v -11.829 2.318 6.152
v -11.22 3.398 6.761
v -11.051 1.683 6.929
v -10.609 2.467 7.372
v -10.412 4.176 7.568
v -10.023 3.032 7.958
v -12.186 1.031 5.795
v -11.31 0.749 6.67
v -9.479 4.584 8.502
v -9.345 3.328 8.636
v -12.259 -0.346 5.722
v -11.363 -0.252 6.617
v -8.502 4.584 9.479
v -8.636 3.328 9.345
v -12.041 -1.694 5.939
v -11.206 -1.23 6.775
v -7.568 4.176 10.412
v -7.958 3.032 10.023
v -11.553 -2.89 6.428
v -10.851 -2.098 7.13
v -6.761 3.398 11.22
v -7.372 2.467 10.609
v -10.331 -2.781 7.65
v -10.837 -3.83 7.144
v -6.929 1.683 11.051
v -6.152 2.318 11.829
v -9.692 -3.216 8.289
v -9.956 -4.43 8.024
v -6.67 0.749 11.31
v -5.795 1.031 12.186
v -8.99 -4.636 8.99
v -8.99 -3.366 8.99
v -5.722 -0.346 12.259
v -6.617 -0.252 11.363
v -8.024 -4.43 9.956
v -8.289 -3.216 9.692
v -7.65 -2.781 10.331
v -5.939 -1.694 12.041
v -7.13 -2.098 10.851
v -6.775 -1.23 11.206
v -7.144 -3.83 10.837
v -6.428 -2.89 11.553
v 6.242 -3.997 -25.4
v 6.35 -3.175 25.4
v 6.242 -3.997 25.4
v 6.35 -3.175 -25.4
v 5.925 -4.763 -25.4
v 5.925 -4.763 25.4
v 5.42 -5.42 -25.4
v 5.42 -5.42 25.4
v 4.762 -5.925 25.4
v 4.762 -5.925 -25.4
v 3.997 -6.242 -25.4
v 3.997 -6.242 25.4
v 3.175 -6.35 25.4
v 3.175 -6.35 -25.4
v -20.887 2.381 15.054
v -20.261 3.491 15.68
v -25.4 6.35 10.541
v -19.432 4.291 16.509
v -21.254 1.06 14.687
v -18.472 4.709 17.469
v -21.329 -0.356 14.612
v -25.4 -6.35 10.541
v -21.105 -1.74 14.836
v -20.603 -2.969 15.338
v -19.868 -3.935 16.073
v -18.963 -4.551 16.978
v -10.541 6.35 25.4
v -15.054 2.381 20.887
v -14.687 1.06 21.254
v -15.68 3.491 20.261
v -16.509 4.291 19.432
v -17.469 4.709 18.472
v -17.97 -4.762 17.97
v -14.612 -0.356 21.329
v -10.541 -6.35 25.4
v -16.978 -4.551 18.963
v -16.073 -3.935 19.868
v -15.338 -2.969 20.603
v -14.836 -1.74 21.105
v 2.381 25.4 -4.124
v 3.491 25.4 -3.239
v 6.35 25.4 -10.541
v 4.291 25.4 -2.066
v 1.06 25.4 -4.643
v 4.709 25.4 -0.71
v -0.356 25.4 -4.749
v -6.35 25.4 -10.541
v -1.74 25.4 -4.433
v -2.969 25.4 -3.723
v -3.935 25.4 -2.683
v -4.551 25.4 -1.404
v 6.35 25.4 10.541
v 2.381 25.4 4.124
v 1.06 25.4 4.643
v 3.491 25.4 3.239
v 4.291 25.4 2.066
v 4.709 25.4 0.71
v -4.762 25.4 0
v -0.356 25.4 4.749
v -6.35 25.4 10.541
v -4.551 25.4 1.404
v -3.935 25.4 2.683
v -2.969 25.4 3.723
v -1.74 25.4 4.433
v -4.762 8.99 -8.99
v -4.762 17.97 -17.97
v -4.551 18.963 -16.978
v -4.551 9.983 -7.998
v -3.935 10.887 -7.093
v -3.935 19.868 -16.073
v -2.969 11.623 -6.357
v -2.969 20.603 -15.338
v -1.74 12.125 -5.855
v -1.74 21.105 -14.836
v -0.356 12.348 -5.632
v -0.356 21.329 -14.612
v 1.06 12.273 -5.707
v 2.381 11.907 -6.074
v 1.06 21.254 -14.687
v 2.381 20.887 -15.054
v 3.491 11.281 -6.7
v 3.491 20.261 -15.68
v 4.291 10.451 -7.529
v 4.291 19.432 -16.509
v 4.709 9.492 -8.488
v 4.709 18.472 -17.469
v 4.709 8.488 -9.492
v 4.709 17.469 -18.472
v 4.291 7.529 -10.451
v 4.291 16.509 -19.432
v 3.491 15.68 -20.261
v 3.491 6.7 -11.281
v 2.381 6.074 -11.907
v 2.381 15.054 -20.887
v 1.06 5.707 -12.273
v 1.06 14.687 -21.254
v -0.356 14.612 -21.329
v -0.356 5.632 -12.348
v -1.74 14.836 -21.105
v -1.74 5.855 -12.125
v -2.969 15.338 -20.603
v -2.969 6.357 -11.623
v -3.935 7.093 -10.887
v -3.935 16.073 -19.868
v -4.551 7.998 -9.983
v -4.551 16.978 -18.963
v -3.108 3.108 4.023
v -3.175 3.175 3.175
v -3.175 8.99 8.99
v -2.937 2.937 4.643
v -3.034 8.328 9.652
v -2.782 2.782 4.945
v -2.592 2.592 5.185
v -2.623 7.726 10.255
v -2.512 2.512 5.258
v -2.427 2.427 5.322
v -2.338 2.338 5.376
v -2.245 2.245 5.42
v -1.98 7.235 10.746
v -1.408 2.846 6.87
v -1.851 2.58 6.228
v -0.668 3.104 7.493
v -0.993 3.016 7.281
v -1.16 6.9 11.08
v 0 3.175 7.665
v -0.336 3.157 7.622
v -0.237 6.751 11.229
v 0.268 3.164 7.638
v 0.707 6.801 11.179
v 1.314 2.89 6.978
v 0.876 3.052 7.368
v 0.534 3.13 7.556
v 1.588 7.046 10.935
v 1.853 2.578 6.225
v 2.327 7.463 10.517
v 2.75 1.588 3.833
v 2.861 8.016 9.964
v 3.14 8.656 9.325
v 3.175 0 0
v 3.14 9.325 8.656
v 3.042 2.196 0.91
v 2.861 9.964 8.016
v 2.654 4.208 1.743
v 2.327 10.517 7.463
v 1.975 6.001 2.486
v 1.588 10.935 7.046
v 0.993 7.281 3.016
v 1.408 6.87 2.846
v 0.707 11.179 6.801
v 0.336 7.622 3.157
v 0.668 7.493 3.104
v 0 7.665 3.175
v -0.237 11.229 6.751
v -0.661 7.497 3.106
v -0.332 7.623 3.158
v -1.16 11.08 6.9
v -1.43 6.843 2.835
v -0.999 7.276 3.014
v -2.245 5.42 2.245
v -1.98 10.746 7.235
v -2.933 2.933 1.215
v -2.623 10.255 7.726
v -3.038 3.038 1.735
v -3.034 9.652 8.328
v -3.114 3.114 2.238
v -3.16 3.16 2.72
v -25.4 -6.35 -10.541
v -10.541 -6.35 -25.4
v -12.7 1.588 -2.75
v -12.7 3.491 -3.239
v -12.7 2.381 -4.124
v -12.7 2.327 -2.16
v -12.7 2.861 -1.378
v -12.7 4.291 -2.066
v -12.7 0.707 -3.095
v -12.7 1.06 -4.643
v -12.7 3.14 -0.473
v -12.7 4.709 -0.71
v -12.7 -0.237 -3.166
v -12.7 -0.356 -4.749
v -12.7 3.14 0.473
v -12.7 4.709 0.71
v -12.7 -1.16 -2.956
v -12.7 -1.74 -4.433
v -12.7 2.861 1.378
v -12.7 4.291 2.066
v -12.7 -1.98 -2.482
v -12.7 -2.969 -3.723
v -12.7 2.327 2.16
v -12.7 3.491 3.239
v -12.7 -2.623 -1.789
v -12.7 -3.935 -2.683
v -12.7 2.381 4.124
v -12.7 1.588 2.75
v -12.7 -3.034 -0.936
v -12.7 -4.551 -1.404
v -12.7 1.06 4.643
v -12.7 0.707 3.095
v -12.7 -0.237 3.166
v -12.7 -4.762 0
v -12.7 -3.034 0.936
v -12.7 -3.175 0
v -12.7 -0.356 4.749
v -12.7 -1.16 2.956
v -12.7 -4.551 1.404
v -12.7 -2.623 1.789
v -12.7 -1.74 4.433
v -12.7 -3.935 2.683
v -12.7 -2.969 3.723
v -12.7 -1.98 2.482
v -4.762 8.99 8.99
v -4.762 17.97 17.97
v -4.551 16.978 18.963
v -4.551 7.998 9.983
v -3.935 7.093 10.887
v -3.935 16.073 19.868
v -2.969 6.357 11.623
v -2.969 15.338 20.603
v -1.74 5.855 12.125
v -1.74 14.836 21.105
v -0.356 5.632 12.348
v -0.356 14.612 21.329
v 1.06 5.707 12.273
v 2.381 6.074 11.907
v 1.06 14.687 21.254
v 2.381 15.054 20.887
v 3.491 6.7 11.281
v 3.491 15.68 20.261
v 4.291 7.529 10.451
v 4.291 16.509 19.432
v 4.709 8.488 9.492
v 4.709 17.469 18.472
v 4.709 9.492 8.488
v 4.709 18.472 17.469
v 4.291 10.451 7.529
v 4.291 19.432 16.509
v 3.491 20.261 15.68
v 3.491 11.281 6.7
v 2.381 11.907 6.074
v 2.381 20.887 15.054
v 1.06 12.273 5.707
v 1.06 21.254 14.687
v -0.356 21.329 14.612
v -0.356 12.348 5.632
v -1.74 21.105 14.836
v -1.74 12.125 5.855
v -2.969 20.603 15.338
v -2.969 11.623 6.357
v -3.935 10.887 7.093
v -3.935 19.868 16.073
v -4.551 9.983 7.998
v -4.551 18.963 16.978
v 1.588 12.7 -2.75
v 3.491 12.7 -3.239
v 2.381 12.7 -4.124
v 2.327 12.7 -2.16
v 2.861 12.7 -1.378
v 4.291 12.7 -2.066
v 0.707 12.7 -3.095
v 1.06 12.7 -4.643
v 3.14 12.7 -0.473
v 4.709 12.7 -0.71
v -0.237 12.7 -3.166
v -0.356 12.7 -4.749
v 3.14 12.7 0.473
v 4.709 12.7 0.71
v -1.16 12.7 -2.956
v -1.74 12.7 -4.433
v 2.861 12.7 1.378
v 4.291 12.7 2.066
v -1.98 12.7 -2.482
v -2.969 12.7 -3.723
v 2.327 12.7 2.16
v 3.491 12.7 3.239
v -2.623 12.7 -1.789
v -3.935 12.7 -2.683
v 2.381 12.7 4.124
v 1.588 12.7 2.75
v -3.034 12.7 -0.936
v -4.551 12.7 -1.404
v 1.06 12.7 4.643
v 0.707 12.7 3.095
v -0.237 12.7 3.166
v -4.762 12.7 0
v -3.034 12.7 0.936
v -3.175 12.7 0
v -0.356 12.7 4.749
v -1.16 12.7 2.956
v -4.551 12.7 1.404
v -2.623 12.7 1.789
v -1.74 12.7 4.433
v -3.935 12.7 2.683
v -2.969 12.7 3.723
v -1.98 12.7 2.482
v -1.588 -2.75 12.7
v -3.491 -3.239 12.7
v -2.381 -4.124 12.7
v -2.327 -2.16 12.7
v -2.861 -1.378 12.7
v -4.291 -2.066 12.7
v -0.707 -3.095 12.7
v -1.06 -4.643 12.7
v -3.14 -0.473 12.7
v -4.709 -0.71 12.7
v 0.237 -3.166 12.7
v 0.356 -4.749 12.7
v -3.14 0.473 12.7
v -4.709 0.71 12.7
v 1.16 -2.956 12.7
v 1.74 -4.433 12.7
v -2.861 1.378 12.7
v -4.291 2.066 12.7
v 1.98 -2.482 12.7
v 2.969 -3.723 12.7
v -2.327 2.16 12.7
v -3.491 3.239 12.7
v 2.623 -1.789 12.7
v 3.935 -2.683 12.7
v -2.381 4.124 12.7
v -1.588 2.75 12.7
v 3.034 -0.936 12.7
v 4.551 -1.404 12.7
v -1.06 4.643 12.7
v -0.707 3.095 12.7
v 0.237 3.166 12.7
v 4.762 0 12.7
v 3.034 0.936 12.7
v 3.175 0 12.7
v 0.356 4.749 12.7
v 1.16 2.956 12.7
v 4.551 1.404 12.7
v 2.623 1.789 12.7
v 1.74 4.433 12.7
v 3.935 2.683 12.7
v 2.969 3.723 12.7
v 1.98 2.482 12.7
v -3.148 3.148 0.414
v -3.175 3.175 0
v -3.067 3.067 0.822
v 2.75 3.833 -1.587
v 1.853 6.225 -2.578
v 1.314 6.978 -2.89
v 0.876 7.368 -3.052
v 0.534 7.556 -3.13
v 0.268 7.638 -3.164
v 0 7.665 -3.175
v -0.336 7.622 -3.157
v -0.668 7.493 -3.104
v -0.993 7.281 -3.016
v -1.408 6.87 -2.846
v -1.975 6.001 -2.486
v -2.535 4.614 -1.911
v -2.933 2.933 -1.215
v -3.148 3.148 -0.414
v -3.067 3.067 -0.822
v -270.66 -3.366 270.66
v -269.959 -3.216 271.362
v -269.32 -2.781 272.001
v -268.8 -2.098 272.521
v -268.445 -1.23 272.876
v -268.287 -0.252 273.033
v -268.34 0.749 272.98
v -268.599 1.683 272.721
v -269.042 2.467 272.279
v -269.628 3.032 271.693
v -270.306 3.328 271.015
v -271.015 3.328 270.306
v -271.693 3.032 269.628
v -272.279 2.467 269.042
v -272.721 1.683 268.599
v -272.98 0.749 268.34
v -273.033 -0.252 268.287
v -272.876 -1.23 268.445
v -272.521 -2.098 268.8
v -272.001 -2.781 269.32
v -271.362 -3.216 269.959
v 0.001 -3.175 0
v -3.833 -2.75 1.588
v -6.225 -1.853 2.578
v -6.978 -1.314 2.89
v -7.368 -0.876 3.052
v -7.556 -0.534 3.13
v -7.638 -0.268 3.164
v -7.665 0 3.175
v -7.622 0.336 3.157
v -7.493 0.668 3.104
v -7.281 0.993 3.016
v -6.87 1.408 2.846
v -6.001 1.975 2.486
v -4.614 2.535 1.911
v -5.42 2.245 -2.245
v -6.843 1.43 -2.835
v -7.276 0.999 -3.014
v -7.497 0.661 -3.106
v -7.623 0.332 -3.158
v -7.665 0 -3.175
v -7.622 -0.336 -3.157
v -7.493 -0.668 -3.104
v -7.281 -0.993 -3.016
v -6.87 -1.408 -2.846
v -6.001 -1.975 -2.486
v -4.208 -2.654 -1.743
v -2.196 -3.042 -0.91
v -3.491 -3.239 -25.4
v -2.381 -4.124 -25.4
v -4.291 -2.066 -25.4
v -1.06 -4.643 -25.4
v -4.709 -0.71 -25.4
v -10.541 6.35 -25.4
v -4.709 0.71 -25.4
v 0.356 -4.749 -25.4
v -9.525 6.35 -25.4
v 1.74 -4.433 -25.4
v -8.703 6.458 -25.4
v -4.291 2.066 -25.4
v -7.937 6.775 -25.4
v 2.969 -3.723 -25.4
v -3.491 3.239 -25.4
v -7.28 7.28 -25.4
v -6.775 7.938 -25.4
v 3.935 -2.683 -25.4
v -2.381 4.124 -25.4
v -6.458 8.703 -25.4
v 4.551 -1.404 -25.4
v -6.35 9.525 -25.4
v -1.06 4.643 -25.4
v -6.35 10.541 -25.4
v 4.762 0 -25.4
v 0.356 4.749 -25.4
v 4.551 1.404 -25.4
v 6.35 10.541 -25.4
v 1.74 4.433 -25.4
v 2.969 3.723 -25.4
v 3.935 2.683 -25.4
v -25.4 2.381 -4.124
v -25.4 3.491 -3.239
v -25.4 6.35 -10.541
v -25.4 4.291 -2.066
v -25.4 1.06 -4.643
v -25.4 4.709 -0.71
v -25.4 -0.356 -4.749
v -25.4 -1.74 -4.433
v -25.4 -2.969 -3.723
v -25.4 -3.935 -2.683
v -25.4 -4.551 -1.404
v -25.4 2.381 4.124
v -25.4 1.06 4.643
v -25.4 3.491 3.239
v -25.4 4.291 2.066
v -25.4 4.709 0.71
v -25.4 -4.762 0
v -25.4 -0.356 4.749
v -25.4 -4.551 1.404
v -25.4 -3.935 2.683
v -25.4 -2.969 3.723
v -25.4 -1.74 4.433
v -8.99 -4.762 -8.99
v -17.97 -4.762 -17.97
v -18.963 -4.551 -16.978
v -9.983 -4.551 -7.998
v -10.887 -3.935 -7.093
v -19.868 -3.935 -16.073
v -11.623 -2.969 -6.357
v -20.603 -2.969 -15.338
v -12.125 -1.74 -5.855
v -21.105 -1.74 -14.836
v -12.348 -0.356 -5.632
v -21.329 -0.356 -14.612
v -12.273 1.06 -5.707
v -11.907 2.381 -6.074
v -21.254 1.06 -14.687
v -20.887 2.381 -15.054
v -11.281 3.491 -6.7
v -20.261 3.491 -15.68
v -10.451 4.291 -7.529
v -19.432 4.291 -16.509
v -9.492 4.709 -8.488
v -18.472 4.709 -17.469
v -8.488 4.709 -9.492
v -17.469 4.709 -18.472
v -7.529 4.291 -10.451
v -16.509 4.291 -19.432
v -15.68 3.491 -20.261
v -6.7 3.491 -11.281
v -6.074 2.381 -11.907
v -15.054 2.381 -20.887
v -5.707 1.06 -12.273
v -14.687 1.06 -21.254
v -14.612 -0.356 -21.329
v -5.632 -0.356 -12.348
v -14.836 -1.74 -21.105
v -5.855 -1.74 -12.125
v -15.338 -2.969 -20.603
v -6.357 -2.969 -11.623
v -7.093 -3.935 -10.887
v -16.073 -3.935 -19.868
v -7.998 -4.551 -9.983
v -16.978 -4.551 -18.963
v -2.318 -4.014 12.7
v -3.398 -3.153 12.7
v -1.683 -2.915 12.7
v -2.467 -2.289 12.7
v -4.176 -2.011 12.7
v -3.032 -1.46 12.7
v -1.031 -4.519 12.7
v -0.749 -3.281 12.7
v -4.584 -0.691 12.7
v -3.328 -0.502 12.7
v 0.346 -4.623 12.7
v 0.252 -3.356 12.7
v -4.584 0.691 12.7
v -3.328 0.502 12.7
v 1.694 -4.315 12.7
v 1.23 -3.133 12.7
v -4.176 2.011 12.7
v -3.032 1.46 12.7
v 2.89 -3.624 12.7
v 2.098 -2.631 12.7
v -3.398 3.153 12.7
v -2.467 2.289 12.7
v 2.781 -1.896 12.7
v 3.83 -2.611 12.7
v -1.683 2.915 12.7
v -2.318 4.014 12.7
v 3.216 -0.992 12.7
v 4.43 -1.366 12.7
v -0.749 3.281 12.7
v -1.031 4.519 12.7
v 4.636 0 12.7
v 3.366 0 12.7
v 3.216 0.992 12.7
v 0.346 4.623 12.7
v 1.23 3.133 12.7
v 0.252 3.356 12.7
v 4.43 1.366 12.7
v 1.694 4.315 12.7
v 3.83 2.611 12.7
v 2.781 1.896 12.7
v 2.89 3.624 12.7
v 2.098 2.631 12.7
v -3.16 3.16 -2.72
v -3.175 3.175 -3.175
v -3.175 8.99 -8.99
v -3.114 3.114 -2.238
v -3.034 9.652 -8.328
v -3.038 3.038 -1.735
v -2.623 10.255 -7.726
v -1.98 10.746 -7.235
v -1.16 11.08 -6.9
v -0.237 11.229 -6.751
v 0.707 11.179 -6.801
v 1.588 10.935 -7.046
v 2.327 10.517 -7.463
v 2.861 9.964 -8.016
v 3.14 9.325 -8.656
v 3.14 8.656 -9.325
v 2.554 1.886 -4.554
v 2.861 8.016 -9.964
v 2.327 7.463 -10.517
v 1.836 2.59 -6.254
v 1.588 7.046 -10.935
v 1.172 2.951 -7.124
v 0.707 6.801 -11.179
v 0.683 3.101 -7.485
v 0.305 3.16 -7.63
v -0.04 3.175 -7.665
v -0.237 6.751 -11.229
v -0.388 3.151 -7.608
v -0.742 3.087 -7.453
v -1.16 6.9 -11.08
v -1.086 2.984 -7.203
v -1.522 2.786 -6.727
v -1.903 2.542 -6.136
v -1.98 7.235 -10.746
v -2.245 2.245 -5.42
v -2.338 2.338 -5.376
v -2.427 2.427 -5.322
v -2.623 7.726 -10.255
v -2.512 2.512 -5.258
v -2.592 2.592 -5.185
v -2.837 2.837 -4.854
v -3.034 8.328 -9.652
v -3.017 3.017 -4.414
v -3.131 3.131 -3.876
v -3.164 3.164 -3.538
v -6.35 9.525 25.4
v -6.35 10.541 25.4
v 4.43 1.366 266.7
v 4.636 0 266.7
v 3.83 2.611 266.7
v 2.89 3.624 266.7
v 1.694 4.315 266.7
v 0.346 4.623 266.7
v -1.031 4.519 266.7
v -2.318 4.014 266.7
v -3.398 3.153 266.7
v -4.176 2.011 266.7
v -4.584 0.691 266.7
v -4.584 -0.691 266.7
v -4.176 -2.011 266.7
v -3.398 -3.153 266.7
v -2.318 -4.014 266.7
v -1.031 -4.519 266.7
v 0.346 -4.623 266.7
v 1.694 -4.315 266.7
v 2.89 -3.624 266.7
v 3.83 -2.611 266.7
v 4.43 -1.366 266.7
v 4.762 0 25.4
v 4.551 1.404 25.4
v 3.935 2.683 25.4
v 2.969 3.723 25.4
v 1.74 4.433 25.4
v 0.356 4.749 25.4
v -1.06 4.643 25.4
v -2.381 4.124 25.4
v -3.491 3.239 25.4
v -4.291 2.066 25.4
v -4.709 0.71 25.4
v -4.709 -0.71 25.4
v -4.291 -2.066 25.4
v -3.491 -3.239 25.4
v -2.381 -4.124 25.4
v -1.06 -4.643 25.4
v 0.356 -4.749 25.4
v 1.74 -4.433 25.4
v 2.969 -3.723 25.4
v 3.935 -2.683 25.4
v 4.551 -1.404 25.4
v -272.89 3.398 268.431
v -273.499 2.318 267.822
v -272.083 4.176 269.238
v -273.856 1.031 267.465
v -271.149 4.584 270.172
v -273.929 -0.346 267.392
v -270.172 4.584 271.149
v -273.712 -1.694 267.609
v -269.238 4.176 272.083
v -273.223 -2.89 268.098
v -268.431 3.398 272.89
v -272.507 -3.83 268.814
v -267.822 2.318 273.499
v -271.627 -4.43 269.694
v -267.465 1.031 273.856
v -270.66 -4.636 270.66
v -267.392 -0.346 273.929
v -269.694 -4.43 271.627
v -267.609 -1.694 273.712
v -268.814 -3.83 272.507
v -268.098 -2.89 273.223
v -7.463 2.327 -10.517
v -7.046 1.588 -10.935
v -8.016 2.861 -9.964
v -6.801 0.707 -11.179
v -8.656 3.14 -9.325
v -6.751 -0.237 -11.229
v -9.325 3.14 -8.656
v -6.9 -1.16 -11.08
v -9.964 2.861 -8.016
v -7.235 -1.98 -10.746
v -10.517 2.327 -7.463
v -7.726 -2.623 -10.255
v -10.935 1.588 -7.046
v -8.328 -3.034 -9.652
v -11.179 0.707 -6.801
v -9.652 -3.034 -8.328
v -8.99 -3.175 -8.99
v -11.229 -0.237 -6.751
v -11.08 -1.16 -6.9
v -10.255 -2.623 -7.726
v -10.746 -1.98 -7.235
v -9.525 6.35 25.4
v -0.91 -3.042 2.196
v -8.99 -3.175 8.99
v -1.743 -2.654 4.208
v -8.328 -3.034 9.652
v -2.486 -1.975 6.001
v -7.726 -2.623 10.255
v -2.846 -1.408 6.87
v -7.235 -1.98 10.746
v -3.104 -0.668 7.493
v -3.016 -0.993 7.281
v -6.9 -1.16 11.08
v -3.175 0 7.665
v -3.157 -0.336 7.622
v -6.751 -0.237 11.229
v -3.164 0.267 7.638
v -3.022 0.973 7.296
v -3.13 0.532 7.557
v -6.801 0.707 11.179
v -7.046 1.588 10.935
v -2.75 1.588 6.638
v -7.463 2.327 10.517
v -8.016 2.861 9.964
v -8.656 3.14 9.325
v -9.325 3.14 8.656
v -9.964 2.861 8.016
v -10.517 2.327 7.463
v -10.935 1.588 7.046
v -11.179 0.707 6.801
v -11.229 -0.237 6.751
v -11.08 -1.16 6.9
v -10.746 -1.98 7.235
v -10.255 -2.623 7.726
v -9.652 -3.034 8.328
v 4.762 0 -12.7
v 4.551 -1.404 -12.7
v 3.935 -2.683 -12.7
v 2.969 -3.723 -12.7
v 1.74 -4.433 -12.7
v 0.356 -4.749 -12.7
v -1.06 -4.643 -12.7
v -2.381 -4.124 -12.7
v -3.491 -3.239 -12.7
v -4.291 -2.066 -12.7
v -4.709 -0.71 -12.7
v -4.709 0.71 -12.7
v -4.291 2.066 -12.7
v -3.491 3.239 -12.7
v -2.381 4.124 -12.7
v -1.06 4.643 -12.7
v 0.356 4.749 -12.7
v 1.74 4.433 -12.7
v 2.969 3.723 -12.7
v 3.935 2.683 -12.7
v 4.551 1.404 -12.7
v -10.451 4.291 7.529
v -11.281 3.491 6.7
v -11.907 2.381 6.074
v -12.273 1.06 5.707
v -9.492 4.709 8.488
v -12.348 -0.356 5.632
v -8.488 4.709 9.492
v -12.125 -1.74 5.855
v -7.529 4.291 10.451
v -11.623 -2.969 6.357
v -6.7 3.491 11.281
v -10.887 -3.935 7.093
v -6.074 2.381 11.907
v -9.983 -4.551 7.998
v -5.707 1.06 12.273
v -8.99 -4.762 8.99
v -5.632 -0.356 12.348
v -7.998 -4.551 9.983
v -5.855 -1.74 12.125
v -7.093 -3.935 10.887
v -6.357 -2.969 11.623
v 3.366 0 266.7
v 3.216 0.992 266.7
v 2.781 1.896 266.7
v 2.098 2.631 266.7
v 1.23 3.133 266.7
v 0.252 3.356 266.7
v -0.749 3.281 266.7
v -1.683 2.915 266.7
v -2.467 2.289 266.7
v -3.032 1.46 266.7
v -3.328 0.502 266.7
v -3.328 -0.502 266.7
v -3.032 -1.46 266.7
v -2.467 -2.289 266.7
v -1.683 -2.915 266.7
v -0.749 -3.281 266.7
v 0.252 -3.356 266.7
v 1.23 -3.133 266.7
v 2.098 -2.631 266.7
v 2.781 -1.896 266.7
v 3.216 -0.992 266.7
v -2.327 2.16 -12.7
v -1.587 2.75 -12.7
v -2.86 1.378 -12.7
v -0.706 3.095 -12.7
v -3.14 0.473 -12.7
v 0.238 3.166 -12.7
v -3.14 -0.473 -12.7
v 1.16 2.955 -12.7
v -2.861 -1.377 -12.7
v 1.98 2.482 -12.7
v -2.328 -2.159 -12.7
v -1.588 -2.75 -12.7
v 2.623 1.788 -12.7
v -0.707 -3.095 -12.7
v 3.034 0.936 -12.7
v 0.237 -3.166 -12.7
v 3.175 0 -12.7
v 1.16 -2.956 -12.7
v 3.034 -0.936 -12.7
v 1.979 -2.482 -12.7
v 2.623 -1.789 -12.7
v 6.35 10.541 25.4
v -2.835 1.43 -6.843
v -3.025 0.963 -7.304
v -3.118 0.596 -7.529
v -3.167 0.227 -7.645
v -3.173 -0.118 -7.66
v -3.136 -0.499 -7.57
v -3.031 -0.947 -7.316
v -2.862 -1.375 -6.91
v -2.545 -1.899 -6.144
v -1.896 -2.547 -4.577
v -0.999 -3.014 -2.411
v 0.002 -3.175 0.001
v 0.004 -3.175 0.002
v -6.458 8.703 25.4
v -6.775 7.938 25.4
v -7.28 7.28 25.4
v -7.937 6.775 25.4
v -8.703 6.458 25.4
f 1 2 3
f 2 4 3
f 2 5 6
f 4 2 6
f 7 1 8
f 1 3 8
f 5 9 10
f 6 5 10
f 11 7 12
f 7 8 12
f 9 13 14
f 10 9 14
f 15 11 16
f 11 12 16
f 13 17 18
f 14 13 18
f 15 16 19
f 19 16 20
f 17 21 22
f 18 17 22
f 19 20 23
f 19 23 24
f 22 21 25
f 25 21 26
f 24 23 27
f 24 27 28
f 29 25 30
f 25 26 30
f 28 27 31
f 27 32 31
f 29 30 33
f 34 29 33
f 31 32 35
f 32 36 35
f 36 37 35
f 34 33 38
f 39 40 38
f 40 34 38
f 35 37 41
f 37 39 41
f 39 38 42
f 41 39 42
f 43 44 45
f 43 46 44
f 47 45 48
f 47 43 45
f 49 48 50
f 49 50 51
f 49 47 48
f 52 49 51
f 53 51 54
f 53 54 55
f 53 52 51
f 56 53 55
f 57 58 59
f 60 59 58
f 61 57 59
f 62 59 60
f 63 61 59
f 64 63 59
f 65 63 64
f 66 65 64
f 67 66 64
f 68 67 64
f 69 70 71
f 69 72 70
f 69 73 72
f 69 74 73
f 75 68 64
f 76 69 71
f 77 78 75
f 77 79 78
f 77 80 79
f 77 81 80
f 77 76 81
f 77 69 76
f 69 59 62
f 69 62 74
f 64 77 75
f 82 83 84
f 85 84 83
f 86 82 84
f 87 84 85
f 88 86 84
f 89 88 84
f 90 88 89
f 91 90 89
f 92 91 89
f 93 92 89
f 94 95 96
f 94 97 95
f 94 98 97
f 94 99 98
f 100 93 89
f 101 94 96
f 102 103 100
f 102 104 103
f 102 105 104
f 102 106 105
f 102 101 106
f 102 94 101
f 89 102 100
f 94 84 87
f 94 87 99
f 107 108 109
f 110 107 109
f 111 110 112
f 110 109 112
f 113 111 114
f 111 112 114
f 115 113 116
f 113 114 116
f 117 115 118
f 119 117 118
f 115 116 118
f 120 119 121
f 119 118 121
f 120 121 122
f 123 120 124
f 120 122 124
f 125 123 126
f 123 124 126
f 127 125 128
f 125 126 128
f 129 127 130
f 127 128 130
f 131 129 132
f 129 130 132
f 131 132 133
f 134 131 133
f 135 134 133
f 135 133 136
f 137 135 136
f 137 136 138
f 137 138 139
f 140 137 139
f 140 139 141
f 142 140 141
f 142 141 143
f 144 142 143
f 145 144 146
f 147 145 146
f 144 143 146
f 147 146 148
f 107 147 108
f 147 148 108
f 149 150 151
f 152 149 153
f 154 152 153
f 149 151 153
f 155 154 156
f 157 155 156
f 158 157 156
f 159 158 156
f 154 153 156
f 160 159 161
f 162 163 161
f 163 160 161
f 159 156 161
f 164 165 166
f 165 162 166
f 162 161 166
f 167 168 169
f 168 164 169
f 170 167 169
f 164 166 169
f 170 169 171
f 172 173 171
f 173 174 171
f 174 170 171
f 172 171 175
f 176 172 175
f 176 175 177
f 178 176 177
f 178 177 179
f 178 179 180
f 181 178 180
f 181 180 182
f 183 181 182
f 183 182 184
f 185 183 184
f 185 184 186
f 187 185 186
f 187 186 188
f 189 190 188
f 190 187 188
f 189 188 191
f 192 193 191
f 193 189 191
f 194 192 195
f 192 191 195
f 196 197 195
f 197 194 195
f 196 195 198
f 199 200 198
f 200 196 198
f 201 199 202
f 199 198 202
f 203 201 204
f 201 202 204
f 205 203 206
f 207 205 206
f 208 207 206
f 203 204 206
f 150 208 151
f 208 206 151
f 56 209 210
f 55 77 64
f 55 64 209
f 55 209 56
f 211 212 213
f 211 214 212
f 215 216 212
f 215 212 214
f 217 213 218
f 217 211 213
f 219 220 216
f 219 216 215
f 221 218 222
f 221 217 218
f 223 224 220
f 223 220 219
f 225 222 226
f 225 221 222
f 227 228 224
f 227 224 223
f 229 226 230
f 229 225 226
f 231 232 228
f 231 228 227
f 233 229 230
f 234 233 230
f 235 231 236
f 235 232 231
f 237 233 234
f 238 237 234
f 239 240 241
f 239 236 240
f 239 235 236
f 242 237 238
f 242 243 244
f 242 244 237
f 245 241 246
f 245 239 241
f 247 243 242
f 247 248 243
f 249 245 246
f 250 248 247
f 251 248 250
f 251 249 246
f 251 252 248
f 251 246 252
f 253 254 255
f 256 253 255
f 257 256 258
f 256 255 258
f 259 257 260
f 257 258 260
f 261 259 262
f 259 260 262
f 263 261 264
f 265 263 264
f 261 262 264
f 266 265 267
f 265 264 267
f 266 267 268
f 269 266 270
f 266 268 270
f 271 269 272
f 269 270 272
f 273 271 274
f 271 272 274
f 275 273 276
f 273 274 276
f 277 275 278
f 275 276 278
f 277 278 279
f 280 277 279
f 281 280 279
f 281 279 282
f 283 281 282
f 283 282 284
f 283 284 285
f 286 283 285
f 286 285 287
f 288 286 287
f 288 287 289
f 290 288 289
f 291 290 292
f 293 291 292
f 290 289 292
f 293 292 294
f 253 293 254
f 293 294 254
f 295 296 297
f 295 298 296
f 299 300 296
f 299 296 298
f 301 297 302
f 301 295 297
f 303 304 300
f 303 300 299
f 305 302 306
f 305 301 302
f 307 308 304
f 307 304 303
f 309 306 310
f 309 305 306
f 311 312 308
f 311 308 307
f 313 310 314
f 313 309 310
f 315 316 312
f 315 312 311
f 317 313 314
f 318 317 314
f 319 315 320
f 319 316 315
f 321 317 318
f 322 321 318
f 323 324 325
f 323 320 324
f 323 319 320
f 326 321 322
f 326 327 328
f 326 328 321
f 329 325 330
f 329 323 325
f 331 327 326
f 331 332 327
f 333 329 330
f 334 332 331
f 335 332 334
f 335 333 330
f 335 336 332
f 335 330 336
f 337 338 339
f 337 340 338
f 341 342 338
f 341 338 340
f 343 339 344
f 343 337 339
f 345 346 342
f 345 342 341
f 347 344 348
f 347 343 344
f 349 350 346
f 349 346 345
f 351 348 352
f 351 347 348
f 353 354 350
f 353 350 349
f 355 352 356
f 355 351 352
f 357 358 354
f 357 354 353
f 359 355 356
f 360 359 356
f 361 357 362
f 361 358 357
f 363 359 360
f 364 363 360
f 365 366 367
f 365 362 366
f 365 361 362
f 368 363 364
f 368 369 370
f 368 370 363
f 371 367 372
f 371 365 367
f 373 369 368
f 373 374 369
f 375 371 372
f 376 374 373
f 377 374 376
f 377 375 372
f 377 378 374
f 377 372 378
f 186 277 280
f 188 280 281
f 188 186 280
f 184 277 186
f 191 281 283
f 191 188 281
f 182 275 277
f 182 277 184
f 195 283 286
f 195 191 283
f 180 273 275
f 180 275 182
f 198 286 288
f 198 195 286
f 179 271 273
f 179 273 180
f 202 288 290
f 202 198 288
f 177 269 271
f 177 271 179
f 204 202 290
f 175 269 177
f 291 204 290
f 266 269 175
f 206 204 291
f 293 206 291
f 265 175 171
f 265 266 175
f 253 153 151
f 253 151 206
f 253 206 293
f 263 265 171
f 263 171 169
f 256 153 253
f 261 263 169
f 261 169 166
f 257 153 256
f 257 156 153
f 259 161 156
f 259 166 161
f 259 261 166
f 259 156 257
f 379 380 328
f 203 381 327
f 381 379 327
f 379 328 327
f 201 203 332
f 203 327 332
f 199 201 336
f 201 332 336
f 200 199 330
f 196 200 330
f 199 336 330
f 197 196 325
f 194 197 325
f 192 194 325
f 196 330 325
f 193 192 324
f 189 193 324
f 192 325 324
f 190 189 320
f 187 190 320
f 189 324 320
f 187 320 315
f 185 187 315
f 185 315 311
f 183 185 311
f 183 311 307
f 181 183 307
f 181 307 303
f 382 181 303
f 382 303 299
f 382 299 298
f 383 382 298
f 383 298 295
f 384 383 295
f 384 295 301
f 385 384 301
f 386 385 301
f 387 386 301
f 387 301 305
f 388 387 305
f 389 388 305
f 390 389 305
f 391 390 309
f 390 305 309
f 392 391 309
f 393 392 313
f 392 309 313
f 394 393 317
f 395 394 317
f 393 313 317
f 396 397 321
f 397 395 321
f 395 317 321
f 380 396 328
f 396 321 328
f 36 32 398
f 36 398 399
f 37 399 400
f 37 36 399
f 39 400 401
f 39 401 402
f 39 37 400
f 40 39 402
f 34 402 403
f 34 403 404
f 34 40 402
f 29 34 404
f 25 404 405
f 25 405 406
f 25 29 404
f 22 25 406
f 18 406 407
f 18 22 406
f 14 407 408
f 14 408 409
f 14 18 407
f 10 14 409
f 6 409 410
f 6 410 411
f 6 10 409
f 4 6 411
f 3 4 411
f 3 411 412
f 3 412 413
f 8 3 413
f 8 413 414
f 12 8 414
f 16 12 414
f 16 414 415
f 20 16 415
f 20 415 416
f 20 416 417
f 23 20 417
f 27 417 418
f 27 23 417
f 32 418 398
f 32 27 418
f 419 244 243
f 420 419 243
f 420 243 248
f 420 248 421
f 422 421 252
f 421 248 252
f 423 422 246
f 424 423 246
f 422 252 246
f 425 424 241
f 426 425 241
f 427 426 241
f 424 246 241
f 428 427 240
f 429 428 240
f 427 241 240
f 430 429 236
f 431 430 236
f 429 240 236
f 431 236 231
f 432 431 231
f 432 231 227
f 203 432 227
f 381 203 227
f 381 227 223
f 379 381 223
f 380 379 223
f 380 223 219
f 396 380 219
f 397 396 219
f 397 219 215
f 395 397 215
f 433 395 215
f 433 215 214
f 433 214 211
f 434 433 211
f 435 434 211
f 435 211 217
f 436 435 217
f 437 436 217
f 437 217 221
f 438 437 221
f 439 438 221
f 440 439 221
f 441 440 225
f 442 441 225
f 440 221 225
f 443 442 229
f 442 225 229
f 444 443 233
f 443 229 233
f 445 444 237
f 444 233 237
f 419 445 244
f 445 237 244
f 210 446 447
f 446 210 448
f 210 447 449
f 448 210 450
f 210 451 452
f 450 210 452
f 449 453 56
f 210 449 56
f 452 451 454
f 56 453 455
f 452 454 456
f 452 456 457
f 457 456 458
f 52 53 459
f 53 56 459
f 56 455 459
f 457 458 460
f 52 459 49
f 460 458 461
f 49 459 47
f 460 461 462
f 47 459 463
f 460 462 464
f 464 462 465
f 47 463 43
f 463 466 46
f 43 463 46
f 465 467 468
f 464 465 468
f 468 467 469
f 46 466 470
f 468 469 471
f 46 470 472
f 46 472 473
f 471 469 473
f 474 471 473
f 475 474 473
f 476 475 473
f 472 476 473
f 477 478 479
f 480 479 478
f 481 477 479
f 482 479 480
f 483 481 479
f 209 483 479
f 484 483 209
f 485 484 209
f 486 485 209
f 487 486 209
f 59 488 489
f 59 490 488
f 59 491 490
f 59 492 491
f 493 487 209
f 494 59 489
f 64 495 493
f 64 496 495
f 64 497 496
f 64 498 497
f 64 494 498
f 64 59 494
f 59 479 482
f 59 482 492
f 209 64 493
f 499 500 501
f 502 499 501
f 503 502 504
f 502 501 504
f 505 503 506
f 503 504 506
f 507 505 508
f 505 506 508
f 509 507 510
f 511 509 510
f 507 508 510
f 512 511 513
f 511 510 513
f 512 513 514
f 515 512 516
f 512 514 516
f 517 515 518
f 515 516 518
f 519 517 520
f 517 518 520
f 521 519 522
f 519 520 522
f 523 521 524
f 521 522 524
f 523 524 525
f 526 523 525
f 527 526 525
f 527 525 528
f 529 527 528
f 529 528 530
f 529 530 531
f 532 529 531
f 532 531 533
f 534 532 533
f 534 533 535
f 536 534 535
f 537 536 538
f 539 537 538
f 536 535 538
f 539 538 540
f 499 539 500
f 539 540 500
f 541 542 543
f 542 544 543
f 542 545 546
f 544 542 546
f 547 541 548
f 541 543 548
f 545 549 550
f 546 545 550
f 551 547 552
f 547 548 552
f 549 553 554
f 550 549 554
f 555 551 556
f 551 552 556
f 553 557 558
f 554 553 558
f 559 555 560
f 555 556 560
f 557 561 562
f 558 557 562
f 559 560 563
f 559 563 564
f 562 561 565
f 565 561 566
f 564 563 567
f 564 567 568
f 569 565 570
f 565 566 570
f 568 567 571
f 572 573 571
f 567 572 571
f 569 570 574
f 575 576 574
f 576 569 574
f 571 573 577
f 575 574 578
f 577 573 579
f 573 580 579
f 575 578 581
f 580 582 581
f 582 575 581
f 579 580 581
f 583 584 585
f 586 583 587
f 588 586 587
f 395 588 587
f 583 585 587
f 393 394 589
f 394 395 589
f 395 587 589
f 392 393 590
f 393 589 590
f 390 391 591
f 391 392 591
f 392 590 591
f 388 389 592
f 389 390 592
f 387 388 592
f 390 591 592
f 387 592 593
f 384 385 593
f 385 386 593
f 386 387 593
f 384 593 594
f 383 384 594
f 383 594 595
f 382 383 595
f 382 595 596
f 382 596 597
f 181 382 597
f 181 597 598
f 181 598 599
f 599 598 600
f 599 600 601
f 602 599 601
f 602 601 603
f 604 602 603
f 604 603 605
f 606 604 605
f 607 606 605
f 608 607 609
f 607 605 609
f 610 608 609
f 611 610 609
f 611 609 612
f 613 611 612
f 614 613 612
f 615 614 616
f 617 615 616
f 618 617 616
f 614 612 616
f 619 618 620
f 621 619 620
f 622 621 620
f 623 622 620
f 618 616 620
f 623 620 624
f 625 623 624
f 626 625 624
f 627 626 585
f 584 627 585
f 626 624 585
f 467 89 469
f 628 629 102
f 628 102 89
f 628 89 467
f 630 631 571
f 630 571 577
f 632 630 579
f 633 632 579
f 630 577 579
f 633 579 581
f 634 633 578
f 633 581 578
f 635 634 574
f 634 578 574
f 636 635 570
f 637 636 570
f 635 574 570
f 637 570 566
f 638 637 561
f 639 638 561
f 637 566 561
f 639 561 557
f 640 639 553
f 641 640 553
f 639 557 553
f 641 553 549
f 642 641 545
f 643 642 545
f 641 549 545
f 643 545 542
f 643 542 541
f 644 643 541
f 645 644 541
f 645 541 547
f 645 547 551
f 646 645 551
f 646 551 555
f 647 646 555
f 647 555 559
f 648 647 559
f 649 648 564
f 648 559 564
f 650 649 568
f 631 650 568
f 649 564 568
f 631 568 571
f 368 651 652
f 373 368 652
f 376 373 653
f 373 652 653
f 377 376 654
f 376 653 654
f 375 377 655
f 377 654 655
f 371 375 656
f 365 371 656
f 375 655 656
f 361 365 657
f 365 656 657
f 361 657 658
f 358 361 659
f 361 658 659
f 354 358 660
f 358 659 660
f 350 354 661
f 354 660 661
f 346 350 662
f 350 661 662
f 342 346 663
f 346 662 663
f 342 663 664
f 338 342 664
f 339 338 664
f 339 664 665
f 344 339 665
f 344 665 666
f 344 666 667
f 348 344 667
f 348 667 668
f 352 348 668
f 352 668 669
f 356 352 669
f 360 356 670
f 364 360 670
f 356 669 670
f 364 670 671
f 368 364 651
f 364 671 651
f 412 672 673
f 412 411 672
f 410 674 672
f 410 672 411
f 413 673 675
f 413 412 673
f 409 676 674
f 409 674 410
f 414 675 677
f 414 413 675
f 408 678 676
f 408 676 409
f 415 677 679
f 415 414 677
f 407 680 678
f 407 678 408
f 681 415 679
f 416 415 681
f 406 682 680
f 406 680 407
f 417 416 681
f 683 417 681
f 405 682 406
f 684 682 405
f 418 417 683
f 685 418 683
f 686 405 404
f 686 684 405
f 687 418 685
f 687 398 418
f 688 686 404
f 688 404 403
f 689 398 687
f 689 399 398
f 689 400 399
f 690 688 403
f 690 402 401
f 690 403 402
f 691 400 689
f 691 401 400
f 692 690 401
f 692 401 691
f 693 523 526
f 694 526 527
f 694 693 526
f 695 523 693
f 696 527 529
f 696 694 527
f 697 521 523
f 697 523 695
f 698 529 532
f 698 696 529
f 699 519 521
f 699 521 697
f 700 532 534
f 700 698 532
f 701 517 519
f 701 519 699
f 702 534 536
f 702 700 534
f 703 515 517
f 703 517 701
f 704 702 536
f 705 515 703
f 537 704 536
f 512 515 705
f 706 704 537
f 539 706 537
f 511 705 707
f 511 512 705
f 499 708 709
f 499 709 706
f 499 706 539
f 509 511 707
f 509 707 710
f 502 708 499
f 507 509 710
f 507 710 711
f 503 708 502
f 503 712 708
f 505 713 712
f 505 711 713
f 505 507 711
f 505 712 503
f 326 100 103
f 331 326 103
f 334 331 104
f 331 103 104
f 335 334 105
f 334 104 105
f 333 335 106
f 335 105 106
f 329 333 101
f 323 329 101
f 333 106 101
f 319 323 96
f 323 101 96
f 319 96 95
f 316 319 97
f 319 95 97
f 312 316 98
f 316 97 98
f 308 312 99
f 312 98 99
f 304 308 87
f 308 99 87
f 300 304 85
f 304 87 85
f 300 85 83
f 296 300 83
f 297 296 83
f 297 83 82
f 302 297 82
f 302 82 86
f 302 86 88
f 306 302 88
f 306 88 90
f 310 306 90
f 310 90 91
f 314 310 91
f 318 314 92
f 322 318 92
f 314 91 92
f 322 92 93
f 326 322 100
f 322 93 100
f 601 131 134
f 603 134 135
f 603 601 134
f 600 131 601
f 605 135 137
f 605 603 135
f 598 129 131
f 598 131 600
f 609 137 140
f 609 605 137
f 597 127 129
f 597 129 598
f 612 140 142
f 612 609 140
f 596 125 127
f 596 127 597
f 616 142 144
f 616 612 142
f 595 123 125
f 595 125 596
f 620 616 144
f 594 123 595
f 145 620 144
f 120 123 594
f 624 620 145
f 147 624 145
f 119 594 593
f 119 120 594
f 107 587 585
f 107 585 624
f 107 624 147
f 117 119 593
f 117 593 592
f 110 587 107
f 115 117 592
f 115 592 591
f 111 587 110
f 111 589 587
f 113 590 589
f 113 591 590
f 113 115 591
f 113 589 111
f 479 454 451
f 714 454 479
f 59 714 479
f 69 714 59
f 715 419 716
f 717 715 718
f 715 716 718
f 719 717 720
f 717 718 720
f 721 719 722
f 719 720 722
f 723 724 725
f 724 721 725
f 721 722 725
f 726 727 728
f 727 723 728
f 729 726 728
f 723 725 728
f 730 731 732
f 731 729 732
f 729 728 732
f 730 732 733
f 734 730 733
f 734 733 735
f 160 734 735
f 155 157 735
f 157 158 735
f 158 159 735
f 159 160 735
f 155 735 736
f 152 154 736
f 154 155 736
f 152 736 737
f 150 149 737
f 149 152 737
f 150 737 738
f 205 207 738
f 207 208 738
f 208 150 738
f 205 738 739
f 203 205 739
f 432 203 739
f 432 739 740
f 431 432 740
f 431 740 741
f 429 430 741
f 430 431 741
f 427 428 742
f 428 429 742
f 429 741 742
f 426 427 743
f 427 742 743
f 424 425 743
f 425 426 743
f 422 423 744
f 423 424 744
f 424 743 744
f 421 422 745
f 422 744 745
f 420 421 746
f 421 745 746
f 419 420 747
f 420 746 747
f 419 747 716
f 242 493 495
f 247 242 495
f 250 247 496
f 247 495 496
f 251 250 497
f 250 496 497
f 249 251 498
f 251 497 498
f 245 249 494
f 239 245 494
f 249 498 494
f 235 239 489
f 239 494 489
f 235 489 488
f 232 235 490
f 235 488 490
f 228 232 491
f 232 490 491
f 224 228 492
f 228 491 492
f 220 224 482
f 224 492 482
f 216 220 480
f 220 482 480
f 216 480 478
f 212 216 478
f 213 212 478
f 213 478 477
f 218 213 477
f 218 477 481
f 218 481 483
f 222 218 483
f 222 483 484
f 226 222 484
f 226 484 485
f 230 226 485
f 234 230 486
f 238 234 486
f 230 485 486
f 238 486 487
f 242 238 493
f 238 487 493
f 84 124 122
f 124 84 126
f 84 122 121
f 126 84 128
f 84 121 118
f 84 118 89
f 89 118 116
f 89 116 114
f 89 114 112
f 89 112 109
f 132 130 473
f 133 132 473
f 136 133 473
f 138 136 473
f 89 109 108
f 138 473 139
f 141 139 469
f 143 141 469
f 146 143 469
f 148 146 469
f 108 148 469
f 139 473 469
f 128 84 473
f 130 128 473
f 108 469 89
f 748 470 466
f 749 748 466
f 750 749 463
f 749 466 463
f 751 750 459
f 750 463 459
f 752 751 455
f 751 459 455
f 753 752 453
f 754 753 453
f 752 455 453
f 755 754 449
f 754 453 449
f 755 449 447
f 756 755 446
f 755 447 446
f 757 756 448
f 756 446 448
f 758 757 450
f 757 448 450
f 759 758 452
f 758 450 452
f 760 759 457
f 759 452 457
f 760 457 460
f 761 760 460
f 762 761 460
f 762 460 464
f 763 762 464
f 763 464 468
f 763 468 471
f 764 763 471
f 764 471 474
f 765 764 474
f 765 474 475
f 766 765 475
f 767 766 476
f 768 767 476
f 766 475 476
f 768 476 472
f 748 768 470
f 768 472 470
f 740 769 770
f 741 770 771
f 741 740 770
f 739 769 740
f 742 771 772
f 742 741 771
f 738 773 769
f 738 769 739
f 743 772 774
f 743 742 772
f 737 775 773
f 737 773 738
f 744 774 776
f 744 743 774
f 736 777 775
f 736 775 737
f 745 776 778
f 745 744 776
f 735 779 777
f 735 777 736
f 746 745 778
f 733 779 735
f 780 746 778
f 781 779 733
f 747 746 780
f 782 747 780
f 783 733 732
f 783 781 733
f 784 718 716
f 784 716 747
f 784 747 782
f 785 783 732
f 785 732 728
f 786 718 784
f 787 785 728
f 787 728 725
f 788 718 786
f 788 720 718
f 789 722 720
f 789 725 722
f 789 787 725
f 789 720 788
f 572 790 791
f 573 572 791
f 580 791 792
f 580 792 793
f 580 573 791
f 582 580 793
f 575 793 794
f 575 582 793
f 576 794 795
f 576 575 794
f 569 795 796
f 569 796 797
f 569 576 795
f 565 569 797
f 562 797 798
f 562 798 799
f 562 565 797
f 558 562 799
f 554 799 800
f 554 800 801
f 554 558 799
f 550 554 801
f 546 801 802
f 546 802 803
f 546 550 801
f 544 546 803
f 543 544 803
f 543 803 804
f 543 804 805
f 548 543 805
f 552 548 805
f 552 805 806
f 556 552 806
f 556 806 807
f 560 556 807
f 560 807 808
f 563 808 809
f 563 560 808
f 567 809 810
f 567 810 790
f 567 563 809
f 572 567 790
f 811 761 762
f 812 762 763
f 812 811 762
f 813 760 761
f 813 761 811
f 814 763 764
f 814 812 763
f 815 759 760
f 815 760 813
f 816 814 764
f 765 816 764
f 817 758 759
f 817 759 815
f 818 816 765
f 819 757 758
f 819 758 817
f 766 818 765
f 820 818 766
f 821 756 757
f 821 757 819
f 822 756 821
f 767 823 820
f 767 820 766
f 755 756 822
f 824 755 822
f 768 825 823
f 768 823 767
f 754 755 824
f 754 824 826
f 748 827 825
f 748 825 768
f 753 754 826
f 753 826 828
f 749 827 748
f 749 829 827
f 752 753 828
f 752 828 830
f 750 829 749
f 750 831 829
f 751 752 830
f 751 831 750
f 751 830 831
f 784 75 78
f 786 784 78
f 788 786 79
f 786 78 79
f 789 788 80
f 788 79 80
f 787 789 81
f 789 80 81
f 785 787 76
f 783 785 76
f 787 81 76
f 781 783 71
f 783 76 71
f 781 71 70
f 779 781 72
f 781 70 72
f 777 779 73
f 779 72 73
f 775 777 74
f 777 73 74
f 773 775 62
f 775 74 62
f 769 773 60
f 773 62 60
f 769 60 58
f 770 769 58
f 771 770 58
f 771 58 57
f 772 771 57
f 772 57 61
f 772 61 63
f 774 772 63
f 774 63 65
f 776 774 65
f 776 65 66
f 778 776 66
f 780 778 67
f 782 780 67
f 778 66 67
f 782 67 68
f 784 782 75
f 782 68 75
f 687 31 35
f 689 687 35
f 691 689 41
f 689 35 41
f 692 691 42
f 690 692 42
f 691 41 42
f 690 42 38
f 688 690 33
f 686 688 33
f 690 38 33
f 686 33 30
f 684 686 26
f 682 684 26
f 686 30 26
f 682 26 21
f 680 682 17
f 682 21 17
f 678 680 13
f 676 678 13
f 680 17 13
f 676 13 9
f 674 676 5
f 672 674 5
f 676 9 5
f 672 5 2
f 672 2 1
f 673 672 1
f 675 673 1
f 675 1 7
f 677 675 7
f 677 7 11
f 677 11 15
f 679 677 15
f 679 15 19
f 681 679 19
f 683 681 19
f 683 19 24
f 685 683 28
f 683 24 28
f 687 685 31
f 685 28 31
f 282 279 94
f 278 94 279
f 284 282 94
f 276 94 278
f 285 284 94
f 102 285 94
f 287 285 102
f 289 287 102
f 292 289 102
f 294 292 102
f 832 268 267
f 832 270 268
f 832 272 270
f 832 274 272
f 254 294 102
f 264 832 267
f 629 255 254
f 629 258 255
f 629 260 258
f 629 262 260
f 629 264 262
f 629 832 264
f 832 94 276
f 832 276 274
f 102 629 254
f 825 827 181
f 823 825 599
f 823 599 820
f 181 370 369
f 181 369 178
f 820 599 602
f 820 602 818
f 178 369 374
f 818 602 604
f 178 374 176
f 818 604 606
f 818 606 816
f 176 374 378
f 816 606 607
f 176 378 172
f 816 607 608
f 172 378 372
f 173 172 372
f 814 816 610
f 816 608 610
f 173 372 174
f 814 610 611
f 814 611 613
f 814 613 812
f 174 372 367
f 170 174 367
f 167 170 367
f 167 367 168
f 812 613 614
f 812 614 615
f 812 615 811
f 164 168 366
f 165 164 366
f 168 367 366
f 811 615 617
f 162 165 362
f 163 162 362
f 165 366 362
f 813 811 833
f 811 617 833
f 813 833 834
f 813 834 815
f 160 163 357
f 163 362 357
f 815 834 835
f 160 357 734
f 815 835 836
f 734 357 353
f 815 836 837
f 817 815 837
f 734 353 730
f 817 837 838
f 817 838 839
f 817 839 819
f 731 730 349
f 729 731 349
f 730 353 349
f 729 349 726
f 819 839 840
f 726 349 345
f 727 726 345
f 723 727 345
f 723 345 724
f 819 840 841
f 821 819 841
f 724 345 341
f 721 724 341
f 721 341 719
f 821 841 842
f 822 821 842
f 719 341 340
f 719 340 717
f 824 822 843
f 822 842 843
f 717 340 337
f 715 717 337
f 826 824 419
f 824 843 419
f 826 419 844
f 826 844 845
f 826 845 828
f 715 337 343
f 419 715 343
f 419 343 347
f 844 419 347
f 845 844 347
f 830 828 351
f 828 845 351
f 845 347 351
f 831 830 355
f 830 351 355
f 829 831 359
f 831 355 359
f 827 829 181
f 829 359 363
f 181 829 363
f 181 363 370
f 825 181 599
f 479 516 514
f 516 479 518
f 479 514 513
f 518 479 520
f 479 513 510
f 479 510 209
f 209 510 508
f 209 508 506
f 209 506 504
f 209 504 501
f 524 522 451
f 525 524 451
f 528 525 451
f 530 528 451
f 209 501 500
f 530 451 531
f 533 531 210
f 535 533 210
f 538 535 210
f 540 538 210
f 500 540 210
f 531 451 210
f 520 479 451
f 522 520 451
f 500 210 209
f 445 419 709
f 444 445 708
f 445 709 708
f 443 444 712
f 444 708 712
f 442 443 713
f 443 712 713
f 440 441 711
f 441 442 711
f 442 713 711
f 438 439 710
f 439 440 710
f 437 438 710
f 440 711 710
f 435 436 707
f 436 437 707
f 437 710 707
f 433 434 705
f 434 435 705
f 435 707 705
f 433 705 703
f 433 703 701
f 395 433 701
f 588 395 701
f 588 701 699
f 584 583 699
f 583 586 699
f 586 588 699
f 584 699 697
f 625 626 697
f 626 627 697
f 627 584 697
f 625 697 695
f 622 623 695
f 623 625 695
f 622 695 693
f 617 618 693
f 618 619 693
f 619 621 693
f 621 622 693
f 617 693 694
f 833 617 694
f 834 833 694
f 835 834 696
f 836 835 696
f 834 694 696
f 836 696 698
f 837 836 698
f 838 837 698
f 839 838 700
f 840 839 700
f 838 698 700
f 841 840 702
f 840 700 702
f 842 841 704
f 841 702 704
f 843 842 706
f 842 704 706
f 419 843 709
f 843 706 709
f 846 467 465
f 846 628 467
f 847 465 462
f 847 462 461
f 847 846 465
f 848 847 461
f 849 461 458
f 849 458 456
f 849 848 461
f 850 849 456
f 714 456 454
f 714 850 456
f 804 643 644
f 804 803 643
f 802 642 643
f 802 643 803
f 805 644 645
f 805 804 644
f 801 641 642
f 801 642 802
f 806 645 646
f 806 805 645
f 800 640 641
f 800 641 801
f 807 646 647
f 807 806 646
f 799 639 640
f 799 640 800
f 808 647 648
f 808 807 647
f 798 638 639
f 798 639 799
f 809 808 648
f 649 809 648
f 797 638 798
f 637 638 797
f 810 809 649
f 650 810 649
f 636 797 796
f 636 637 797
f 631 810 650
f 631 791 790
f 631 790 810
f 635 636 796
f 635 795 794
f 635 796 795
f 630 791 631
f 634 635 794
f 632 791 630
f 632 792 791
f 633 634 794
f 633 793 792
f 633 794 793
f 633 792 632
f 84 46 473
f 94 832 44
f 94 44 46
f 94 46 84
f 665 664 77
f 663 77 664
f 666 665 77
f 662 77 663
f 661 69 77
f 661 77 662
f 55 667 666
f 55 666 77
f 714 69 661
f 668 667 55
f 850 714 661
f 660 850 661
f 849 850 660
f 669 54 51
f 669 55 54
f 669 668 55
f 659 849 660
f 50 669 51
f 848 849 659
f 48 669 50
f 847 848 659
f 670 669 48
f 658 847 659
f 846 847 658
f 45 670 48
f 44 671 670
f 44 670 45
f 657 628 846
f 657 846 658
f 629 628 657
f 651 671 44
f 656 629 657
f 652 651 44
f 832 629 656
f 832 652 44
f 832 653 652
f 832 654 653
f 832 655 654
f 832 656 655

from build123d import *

# Parameters (mm, degrees)
F1_DEPTH  = 25.4
F2_SIZE   = 14.859
F3_R      = 3.175
F4_DEPTH  = 50.801
F5_R      = 3.175
F6_DEPTH  = 25.401
F7_R      = 3.175
F8_DEPTH  = 25.401
F9_R      = 3.175
F10_DEPTH = 25.4151248226
F11_R     = 3.175
F12_DEPTH = 25.4158319294
F13_R     = 3.175
F14_DEPTH = 25.4151248226
F15_R     = 3.175
F16_DEPTH = 25.4155629873
F17_R     = 3.175
F18_R     = 3.175
F19_R     = 4.7625
F20_DEPTH = 12.7
F21_R     = 4.7625
F22_DEPTH = 12.7
F23_R     = 4.7625
F24_DEPTH = 12.7
F25_R     = 4.7625
F26_DEPTH = 12.7
F27_R     = 4.7625
F28_DEPTH = 12.7
F29_R     = 4.7625
F30_DEPTH = 12.7
F31_R     = 4.7625
F32_DEPTH = 12.7
F33_R     = 4.7625
F36_DEPTH = 12.7
F37_R     = 4.6355
F37_R_2   = 3.3655
F38_DEPTH = 254
F39_R     = 4.6355
F39_R_2   = 3.3655
F40_DEPTH = 370.0574209815


# Not quite as in the source:
# - a variable given as a bare number and used for a length is read in inches; the dataset says mm whatever the document's units were


with BuildPart() as f1:
    # F0 (on Top) → F1 (new body, symmetric)
    with BuildSketch(Plane.XY):
        Polygon((-6.35, 25.4), (-6.35, 6.35), (-25.4, 6.35), (-25.4, -6.35), (6.35, -6.35), (6.35, 25.4), align=None)
    extrude(amount=F1_DEPTH, both=True)

    # F2
    f2_edges = [f1.edges().sort_by_distance(p)[0] for p in [
        (-25.4, 0, 25.4),
        (-25.4, 0, -25.4),
        (0, 25.4, -25.4),
        (0, 25.4, 25.4),
    ]]
    chamfer(f2_edges, length=F2_SIZE)

    # F3 (on face) → F4 (cut, through all)
    with BuildSketch(Plane.XY.offset(25.4)):
        Circle(F3_R)
    extrude(amount=-F4_DEPTH, mode=Mode.SUBTRACT)

    # F5 (on face) → F6 (cut, through all)
    with BuildSketch(Plane(origin=(-25.4, 0, 0), x_dir=(0, -1, 0), z_dir=(-1, 0, 0))):
        Circle(F5_R)
    extrude(amount=-F6_DEPTH, mode=Mode.SUBTRACT)

    # F7 (on face) → F8 (cut, through all)
    with BuildSketch(Plane(origin=(0, 25.4, 0), x_dir=(-1, 0, 0), z_dir=(0, 1, 0))):
        Circle(F7_R)
    extrude(amount=-F8_DEPTH, mode=Mode.SUBTRACT)

    # F9 (on face) → F10 (cut, through all)
    with BuildSketch(Plane(origin=(0, 17.9705, 17.9705), x_dir=(-1, 0, 0), z_dir=(0, 0.7071067812, 0.7071067812))):
        Circle(F9_R)
    extrude(amount=-F10_DEPTH, mode=Mode.SUBTRACT)

    # F11 (on face) → F12 (cut, through all)
    with BuildSketch(Plane(origin=(-17.9705, 0, 17.9705), x_dir=(0, -1, 0), z_dir=(-0.7071067812, 0, 0.7071067812))):
        Circle(F11_R)
    extrude(amount=-F12_DEPTH, mode=Mode.SUBTRACT)

    # F13 (on face) → F14 (cut, through all)
    with BuildSketch(Plane(origin=(0, 17.9705, -17.9705), x_dir=(-1, 0, 0), z_dir=(0, 0.7071067812, -0.7071067812))):
        Circle(F13_R)
    extrude(amount=-F14_DEPTH, mode=Mode.SUBTRACT)

    # F15 (on face) → F16 (cut, through all)
    with BuildSketch(Plane(origin=(-17.9705, 0, -17.9705), x_dir=(0, -1, 0), z_dir=(-0.7071067812, 0, -0.7071067812))):
        Circle(F15_R)
    extrude(amount=-F16_DEPTH, mode=Mode.SUBTRACT)

    # F17
    f17_edges = [f1.edges().sort_by_distance(p)[0] for p in [
        (-6.35, 6.35, 0),
    ]]
    fillet(f17_edges, radius=F17_R)

    # F18
    f18_edges = [f1.edges().sort_by_distance(p)[0] for p in [
        (6.35, -6.35, 0),
    ]]
    fillet(f18_edges, radius=F18_R)

    # F19 (on face) → F20 (cut)
    with BuildSketch(Plane(origin=(0, 0, -25.4), x_dir=(1, 0, 0), z_dir=(0, 0, -1))):
        Circle(F19_R)
    extrude(amount=-F20_DEPTH, mode=Mode.SUBTRACT)

    # F21 (on face) → F22 (cut)
    with BuildSketch(Plane.XY.offset(25.4)):
        Circle(F21_R)
    extrude(amount=-F22_DEPTH, mode=Mode.SUBTRACT)

    # F23 (on face) → F24 (cut)
    with BuildSketch(Plane(origin=(-25.4, 0, 0), x_dir=(0, -1, 0), z_dir=(-1, 0, 0))):
        Circle(F23_R)
    extrude(amount=-F24_DEPTH, mode=Mode.SUBTRACT)

    # F25 (on face) → F26 (cut)
    with BuildSketch(Plane(origin=(0, 25.4, 0), x_dir=(-1, 0, 0), z_dir=(0, 1, 0))):
        Circle(F25_R)
    extrude(amount=-F26_DEPTH, mode=Mode.SUBTRACT)

    # F27 (on face) → F28 (cut)
    with BuildSketch(Plane(origin=(-17.9705, 0, 17.9705), x_dir=(0, -1, 0), z_dir=(-0.7071067812, 0, 0.7071067812))):
        Circle(F27_R)
    extrude(amount=-F28_DEPTH, mode=Mode.SUBTRACT)

    # F29 (on face) → F30 (cut)
    with BuildSketch(Plane(origin=(0, 17.9705, 17.9705), x_dir=(-1, 0, 0), z_dir=(0, 0.7071067812, 0.7071067812))):
        Circle(F29_R)
    extrude(amount=-F30_DEPTH, mode=Mode.SUBTRACT)

    # F31 (on face) → F32 (cut)
    with BuildSketch(Plane(origin=(0, 17.9705, -17.9705), x_dir=(-1, 0, 0), z_dir=(0, 0.7071067812, -0.7071067812))):
        Circle(F31_R)
    extrude(amount=-F32_DEPTH, mode=Mode.SUBTRACT)

    # F33 (on face) → F36 (cut)
    with BuildSketch(Plane(origin=(-17.9705, 0, -17.9705), x_dir=(0, -1, 0), z_dir=(-0.7071067812, 0, -0.7071067812))):
        Circle(F33_R)
    extrude(amount=-F36_DEPTH, mode=Mode.SUBTRACT)


with BuildPart() as f38:
    # F37 (on face) → F38 (new body)
    with BuildSketch(Plane.XY.offset(12.7)):
        Circle(F37_R)
        Circle(F37_R_2, mode=Mode.SUBTRACT)
    extrude(amount=F38_DEPTH)


with BuildPart() as f40:
    # F39 (on face) → F40 (new body)
    with BuildSketch(Plane(origin=(-8.9902438789, 0, 8.9902438789), x_dir=(0, -1, 0), z_dir=(-0.7071067812, 0, 0.7071067812))):
        Circle(F39_R)
        Circle(F39_R_2, mode=Mode.SUBTRACT)
    extrude(amount=F40_DEPTH)


solid = Compound([f1.part, f38.part, f40.part])
